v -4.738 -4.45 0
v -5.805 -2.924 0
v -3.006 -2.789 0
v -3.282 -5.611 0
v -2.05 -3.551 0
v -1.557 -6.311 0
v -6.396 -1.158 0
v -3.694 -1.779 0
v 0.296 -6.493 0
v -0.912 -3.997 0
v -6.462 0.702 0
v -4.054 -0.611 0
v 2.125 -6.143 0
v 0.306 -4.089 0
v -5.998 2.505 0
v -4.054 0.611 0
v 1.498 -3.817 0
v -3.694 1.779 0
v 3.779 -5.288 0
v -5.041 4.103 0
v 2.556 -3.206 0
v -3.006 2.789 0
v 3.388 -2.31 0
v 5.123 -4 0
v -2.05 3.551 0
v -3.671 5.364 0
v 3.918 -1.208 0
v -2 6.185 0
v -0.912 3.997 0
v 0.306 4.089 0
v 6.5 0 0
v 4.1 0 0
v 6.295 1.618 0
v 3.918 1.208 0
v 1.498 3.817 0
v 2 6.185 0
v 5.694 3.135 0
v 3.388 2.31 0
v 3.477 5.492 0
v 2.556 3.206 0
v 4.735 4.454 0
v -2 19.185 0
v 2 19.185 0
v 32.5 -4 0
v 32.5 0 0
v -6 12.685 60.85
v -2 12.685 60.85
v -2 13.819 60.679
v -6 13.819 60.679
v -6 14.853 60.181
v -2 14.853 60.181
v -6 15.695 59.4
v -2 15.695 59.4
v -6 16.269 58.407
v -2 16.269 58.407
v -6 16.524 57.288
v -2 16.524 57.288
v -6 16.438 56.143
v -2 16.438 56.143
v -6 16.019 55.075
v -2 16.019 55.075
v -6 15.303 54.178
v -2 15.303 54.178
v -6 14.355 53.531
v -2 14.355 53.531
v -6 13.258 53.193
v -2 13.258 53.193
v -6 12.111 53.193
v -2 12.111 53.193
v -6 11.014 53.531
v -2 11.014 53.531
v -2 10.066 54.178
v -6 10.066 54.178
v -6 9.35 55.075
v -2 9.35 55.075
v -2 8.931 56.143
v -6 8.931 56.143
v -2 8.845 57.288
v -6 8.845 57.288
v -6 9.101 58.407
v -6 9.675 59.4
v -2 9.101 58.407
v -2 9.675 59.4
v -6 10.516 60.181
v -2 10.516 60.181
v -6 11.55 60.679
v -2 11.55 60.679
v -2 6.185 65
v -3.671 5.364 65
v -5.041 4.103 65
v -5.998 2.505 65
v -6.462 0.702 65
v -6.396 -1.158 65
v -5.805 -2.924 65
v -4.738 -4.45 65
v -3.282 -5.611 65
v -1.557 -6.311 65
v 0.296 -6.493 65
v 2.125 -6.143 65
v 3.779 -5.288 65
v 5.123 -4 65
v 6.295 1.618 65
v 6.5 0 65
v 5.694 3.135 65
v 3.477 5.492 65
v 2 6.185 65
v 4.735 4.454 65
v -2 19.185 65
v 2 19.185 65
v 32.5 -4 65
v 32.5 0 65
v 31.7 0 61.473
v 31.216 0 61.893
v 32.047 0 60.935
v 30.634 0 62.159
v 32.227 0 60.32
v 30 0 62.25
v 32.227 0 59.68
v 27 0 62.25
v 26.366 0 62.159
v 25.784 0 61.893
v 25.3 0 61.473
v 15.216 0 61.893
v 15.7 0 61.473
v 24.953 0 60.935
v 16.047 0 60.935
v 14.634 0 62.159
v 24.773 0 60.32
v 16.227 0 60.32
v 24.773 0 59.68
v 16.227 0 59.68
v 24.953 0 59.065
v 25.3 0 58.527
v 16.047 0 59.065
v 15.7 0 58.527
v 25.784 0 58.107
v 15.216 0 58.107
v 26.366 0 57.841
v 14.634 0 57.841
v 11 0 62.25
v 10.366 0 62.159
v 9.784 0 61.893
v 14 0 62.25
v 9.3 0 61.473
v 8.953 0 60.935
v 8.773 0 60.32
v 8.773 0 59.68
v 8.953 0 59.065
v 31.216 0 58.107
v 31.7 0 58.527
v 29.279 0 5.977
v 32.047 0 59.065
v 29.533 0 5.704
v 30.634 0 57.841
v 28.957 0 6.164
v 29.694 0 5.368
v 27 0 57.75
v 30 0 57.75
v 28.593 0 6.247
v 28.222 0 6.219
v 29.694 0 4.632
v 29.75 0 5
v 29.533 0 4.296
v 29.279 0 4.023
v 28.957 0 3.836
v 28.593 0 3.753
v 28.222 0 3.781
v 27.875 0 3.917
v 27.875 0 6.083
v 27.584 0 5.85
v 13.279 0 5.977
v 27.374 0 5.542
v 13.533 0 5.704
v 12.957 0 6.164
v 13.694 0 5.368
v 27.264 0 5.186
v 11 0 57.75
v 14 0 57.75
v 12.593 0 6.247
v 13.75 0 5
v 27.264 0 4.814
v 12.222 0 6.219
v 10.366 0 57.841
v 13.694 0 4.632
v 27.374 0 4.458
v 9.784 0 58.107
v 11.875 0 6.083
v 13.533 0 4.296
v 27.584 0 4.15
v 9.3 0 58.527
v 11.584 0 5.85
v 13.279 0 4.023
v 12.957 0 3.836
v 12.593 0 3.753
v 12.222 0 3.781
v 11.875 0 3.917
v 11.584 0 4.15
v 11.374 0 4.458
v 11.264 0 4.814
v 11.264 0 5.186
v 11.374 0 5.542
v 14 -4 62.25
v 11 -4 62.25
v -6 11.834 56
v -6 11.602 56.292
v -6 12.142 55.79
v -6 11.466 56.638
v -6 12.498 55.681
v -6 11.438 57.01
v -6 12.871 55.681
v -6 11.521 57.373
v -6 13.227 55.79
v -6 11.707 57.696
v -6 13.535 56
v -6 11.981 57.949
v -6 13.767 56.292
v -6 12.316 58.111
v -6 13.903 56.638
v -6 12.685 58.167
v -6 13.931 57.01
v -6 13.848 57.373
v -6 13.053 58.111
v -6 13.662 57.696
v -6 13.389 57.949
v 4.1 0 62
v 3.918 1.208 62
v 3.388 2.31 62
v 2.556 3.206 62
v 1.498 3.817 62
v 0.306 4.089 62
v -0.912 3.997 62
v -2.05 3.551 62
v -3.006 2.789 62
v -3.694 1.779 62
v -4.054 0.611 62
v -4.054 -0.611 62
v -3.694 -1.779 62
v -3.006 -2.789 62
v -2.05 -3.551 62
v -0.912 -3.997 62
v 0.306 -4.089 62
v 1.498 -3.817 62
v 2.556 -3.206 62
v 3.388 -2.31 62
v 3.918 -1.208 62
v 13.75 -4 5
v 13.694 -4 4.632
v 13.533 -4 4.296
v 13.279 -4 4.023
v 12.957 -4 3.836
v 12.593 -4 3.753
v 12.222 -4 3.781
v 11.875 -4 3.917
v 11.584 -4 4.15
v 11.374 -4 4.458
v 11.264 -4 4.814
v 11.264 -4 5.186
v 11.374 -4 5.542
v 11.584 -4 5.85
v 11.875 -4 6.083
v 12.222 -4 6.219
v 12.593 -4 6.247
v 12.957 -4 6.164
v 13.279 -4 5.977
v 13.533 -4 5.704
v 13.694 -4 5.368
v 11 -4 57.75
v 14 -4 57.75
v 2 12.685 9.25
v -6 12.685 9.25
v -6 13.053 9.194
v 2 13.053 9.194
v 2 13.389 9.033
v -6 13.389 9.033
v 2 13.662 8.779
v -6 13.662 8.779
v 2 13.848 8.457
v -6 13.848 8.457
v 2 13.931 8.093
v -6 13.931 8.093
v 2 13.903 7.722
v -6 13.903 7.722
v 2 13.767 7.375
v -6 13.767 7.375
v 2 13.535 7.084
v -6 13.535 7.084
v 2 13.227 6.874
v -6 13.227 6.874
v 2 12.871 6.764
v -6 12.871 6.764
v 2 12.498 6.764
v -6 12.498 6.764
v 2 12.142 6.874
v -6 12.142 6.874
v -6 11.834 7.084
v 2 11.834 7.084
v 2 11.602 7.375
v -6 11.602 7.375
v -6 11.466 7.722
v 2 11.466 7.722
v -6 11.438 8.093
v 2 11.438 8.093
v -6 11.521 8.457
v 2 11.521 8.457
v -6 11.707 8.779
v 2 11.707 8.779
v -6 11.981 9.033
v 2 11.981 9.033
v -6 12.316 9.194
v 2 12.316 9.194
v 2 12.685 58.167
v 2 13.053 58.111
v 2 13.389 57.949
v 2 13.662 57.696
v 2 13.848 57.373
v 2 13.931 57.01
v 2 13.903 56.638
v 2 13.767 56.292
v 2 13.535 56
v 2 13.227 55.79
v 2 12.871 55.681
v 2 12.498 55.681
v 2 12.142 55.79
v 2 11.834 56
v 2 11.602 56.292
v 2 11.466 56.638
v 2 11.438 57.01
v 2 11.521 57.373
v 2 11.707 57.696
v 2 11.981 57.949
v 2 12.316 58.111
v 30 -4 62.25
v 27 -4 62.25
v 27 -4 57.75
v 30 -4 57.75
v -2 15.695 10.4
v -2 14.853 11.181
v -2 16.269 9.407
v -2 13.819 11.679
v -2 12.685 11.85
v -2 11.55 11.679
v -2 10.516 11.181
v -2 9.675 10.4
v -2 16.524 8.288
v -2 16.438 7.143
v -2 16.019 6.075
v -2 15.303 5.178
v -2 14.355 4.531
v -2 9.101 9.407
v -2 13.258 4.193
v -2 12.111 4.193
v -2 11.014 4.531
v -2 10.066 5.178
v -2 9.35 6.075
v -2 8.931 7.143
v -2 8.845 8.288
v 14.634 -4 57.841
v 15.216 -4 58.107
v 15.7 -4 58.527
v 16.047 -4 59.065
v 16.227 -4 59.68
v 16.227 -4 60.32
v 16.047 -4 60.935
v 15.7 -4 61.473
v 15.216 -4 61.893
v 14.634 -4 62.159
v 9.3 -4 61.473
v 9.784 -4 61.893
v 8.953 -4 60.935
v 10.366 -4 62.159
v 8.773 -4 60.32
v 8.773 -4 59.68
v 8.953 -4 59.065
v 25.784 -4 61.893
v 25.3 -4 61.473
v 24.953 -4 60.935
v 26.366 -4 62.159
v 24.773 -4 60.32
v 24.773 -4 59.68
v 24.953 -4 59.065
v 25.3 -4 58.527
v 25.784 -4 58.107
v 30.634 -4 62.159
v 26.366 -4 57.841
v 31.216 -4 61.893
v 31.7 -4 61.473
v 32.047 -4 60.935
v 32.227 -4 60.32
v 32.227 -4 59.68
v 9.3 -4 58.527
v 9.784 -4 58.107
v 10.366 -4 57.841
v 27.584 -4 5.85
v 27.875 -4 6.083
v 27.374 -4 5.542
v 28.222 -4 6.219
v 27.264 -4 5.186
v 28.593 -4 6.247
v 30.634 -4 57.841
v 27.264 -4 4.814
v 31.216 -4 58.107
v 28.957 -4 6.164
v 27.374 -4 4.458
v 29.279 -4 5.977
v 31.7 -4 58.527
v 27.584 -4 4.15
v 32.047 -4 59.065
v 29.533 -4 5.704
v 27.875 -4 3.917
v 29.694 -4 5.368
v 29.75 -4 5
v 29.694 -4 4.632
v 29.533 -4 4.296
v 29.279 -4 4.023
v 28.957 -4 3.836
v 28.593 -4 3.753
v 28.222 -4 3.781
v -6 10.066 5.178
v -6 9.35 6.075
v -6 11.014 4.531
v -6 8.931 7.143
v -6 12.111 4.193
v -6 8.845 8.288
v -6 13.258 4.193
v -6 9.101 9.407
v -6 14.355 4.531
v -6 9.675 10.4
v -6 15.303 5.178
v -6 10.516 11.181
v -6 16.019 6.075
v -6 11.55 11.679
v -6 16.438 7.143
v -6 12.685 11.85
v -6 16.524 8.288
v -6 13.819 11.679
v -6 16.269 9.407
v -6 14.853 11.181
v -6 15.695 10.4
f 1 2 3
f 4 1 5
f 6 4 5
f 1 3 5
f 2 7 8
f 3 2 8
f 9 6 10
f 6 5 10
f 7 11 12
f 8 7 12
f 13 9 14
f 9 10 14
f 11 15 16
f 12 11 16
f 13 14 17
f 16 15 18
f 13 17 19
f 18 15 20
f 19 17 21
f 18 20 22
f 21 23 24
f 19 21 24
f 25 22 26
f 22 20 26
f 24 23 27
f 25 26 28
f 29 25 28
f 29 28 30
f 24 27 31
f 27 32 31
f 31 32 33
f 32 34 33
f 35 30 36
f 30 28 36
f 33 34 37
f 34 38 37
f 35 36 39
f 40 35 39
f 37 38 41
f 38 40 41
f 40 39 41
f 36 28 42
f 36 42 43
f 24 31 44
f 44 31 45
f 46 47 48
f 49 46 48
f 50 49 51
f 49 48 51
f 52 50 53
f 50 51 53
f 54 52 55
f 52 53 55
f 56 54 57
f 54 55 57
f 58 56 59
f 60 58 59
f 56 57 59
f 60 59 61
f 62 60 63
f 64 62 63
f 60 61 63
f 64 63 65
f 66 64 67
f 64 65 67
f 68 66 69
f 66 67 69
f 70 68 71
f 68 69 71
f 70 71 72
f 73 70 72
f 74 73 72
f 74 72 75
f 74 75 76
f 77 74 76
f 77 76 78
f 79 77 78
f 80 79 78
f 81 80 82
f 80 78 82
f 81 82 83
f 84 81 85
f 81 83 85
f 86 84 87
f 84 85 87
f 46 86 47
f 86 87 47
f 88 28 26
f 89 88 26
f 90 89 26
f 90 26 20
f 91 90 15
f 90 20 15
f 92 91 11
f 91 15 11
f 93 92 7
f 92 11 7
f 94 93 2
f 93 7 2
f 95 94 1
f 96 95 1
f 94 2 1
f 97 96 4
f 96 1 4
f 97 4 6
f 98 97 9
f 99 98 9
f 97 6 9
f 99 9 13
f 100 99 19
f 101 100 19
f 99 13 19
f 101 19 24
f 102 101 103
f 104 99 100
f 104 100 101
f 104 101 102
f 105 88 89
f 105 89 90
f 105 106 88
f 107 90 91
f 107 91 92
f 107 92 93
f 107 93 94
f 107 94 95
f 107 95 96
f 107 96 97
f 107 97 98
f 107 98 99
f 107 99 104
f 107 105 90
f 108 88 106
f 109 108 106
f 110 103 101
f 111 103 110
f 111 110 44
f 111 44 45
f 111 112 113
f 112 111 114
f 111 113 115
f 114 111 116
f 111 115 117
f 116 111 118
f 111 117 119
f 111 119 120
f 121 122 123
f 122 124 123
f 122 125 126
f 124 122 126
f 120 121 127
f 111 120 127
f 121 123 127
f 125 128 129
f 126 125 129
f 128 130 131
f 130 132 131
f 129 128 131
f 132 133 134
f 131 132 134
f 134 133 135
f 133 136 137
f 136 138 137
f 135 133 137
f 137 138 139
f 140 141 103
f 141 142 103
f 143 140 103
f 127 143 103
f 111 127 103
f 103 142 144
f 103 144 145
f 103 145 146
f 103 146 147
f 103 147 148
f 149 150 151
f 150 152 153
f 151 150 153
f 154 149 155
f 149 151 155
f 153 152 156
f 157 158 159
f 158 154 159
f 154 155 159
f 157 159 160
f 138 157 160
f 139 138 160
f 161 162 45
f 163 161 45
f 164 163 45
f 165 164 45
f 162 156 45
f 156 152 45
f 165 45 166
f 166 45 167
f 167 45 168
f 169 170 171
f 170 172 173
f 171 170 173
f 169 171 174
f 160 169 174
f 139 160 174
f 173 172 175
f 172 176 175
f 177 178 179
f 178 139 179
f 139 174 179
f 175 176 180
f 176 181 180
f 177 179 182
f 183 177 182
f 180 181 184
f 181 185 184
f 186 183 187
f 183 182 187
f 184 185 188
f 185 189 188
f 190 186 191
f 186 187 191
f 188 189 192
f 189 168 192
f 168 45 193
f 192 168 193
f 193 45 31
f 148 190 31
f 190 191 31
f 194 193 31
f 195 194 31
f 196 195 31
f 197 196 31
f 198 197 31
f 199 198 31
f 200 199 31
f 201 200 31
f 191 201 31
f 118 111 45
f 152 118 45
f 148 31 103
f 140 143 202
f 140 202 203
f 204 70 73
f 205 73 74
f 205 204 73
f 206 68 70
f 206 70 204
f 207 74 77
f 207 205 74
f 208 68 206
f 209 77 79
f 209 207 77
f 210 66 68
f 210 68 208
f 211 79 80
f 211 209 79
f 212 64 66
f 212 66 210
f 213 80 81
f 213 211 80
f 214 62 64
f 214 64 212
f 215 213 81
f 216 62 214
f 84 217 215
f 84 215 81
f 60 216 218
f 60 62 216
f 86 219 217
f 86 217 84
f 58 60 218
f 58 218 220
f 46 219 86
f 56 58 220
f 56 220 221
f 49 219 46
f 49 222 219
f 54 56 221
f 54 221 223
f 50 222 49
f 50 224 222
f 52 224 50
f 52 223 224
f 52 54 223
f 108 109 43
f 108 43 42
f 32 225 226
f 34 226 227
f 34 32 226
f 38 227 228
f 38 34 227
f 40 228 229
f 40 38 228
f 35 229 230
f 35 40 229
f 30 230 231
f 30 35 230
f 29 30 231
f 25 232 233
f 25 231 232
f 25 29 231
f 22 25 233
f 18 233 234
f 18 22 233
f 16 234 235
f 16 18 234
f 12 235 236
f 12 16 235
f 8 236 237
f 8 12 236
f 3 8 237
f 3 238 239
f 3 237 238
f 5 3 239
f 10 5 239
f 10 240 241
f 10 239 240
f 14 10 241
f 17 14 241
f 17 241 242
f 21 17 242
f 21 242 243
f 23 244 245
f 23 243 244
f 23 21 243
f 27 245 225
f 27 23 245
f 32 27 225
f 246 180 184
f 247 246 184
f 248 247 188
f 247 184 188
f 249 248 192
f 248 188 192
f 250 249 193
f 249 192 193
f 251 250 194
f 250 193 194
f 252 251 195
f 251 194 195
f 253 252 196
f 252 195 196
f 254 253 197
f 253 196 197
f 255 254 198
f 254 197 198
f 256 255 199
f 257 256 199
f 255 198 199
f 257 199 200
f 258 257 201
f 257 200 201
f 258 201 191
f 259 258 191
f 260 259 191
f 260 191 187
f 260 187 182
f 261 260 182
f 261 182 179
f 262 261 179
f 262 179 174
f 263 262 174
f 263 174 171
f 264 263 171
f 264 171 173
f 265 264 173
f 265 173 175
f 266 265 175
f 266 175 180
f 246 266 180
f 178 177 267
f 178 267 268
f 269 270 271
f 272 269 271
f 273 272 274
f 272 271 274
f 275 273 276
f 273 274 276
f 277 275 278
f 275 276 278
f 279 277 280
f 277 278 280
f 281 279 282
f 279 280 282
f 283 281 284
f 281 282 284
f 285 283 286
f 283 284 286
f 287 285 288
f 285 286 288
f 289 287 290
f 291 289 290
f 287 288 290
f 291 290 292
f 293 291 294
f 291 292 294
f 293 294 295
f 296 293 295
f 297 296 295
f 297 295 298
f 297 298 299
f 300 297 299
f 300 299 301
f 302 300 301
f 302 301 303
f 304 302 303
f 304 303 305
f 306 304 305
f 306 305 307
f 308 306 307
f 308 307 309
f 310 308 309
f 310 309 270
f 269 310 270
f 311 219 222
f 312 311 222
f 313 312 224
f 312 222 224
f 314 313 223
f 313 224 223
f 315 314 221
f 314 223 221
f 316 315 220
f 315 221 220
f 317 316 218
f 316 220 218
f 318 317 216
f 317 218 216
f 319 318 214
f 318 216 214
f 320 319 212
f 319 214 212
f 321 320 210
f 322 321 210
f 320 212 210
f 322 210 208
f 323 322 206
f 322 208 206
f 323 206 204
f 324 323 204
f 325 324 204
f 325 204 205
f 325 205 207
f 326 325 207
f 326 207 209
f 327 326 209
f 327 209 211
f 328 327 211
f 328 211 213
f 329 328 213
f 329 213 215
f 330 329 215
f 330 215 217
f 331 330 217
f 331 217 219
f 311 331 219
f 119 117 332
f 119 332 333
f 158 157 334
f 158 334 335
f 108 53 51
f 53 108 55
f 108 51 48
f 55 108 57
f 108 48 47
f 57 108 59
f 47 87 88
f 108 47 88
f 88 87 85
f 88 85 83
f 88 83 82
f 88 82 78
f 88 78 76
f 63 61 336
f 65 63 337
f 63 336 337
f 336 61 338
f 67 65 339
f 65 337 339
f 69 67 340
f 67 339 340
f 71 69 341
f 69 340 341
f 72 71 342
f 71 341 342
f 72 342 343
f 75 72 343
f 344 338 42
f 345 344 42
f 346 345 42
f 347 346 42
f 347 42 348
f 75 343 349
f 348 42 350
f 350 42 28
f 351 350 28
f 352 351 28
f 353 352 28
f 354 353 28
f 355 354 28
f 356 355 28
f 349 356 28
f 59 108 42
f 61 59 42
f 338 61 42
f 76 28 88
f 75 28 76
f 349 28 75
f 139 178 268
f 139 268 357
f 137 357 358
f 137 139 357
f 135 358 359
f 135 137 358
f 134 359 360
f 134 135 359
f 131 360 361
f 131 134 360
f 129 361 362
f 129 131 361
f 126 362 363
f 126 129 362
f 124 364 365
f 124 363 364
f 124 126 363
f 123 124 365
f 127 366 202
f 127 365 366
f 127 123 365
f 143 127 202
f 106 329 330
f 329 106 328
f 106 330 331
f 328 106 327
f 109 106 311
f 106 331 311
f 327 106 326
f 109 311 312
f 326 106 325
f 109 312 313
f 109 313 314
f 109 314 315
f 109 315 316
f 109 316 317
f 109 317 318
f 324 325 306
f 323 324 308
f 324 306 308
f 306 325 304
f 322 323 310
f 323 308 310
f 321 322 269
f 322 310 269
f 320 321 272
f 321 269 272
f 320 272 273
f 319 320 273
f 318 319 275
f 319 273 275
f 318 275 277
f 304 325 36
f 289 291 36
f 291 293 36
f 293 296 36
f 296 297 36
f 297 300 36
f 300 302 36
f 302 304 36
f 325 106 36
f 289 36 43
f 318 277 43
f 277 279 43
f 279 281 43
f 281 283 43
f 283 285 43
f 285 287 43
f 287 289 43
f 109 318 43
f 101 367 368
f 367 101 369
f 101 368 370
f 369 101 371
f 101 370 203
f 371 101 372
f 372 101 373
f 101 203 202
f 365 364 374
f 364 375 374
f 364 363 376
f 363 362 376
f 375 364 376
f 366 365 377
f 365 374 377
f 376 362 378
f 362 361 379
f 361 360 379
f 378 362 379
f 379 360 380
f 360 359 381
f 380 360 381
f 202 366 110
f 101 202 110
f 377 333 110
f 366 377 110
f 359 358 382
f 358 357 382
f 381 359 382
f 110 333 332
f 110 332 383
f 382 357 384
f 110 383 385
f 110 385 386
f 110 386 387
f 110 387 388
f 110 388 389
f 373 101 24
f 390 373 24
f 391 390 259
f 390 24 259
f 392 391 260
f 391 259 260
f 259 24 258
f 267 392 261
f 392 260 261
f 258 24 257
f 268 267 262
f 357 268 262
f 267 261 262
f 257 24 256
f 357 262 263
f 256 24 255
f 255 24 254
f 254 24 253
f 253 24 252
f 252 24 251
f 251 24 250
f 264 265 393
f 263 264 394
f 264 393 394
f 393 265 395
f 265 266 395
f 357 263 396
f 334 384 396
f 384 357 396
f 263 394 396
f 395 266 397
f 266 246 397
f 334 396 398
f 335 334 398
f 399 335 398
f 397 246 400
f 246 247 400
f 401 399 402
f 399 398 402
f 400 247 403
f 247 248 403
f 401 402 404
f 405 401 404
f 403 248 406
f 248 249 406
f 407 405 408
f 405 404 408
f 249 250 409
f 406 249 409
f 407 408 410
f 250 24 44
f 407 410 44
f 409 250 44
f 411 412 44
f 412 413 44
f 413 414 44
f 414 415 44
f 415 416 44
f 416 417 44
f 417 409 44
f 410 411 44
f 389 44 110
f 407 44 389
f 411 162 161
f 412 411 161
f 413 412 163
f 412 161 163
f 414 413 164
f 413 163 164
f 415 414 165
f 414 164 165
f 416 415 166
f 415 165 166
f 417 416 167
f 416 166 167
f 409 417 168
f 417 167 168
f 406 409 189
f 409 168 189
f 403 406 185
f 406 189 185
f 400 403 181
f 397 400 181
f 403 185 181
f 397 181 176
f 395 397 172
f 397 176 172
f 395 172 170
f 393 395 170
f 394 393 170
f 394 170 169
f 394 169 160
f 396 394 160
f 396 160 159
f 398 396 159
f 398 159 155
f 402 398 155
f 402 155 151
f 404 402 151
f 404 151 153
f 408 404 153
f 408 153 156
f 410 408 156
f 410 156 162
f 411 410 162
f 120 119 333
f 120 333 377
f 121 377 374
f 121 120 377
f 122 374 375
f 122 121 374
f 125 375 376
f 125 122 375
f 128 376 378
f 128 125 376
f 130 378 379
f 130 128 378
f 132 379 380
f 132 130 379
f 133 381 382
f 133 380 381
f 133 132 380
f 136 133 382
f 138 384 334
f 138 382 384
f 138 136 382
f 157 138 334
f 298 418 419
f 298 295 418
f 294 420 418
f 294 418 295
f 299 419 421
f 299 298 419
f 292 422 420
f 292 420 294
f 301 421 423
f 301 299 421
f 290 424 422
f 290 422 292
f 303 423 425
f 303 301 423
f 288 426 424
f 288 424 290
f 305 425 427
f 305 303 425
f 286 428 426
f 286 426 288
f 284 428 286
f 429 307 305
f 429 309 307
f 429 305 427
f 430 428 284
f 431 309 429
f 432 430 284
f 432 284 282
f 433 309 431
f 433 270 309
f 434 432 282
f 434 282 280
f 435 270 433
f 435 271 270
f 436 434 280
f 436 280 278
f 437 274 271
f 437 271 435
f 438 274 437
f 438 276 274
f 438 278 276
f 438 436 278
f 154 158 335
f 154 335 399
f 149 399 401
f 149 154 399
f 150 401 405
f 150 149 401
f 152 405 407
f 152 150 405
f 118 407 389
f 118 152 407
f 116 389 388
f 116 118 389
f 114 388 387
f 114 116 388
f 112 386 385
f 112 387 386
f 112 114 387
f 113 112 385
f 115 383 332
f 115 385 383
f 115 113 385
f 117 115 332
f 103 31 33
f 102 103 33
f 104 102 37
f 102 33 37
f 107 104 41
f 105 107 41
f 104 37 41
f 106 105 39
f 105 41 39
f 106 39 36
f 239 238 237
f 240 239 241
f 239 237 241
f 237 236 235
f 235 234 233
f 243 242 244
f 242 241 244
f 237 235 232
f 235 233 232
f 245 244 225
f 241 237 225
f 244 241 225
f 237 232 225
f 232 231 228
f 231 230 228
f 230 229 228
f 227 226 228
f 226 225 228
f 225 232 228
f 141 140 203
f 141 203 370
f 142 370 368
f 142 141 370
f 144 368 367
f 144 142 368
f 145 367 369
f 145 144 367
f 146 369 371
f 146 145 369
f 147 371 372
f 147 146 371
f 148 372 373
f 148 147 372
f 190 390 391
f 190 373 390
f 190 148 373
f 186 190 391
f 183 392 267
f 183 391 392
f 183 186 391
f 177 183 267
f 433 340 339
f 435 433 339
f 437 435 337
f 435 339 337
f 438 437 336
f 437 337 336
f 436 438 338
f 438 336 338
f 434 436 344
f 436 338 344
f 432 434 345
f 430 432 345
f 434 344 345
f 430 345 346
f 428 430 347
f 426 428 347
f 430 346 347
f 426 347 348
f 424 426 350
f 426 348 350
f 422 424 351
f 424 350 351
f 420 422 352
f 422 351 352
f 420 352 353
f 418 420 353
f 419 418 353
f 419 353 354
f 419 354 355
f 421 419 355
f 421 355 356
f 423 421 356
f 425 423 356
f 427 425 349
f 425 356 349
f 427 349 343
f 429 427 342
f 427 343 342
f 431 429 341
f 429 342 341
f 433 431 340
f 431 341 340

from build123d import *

# Parameters (mm, degrees)
SKETCH_1_R          = 4.1
EXTRUDE_1_DEPTH     = 65
SKETCH_2_R          = 4.923200542
EXTRUDE_2_DEPTH     = 3
SKETCH_3_R          = 1.25
CUT_EXTRUDE_1_DEPTH = 13
SKETCH_4_R          = 3.85
EXTRUDE_3_DEPTH     = 4
SKETCH_5_R          = 1.25
CUT_EXTRUDE_2_DEPTH = 14


with BuildPart() as part:
    # Эскиз1 → Бобышка-Вытянуть1 (new body)
    with BuildSketch(Plane.XY):
        with BuildLine():
            Line((5.123475383, -4), (32.5, -4))
            Line((32.5, -4), (32.5, 0))
            Line((32.5, 0), (6.5, 0))
            ThreePointArc((6.5, 0), (5.25594901, 3.824264635), (2, 6.184658438))
            Line((2, 6.184658438), (2, 19.184658438))
            Line((2, 19.184658438), (-2, 19.184658438))
            Line((-2, 19.184658438), (-2, 6.184658438))
            ThreePointArc((-2, 6.184658438), (-5.326428587, -3.725474266), (5.123475383, -4))
        make_face()
        Circle(SKETCH_1_R, mode=Mode.SUBTRACT)
    extrude(amount=EXTRUDE_1_DEPTH)

    # Эскиз2 → Бобышка-Вытянуть2 (add)
    with BuildSketch(Plane.XY.offset(65)):
        Circle(SKETCH_2_R)
    extrude(amount=-EXTRUDE_2_DEPTH)

    # Эскиз3 → Вырез-Вытянуть1 (cut)
    with BuildSketch(Plane(origin=(0, 0, 0), x_dir=(1, 0, 0), z_dir=(0, 1, 0))):
        with Locations((12.5, -5)):
            Circle(SKETCH_3_R)
        with Locations((28.5, -5)):
            Circle(SKETCH_3_R)
        with BuildLine():
            Line((27, -57.75), (30, -57.75))
            ThreePointArc((30, -57.75), (32.25, -60), (30, -62.25))
            Line((30, -62.25), (27, -62.25))
            ThreePointArc((27, -62.25), (24.75, -60), (27, -57.75))
        make_face()
        with BuildLine():
            Line((11, -57.75), (14, -57.75))
            ThreePointArc((14, -57.75), (16.25, -60), (14, -62.25))
            Line((14, -62.25), (11, -62.25))
            ThreePointArc((11, -62.25), (8.75, -60), (11, -57.75))
        make_face()
    extrude(amount=-CUT_EXTRUDE_1_DEPTH, mode=Mode.SUBTRACT)

    # Эскиз4 → Бобышка-Вытянуть3 (add)
    with BuildSketch(Plane.ZY.offset(2)):
        with Locations((8, 12.684658438)):
            Circle(SKETCH_4_R)
        with Locations((57, 12.684658438)):
            Circle(SKETCH_4_R)
    extrude(amount=EXTRUDE_3_DEPTH)

    # Эскиз5 → Вырез-Вытянуть2 (cut)
    with BuildSketch(Plane.ZY.offset(6)):
        with Locations((8, 12.684658438)):
            Circle(SKETCH_5_R)
        with Locations((56.916589889, 12.684658438)):
            Circle(SKETCH_5_R)
    extrude(amount=-CUT_EXTRUDE_2_DEPTH, mode=Mode.SUBTRACT)


solid = part.part
